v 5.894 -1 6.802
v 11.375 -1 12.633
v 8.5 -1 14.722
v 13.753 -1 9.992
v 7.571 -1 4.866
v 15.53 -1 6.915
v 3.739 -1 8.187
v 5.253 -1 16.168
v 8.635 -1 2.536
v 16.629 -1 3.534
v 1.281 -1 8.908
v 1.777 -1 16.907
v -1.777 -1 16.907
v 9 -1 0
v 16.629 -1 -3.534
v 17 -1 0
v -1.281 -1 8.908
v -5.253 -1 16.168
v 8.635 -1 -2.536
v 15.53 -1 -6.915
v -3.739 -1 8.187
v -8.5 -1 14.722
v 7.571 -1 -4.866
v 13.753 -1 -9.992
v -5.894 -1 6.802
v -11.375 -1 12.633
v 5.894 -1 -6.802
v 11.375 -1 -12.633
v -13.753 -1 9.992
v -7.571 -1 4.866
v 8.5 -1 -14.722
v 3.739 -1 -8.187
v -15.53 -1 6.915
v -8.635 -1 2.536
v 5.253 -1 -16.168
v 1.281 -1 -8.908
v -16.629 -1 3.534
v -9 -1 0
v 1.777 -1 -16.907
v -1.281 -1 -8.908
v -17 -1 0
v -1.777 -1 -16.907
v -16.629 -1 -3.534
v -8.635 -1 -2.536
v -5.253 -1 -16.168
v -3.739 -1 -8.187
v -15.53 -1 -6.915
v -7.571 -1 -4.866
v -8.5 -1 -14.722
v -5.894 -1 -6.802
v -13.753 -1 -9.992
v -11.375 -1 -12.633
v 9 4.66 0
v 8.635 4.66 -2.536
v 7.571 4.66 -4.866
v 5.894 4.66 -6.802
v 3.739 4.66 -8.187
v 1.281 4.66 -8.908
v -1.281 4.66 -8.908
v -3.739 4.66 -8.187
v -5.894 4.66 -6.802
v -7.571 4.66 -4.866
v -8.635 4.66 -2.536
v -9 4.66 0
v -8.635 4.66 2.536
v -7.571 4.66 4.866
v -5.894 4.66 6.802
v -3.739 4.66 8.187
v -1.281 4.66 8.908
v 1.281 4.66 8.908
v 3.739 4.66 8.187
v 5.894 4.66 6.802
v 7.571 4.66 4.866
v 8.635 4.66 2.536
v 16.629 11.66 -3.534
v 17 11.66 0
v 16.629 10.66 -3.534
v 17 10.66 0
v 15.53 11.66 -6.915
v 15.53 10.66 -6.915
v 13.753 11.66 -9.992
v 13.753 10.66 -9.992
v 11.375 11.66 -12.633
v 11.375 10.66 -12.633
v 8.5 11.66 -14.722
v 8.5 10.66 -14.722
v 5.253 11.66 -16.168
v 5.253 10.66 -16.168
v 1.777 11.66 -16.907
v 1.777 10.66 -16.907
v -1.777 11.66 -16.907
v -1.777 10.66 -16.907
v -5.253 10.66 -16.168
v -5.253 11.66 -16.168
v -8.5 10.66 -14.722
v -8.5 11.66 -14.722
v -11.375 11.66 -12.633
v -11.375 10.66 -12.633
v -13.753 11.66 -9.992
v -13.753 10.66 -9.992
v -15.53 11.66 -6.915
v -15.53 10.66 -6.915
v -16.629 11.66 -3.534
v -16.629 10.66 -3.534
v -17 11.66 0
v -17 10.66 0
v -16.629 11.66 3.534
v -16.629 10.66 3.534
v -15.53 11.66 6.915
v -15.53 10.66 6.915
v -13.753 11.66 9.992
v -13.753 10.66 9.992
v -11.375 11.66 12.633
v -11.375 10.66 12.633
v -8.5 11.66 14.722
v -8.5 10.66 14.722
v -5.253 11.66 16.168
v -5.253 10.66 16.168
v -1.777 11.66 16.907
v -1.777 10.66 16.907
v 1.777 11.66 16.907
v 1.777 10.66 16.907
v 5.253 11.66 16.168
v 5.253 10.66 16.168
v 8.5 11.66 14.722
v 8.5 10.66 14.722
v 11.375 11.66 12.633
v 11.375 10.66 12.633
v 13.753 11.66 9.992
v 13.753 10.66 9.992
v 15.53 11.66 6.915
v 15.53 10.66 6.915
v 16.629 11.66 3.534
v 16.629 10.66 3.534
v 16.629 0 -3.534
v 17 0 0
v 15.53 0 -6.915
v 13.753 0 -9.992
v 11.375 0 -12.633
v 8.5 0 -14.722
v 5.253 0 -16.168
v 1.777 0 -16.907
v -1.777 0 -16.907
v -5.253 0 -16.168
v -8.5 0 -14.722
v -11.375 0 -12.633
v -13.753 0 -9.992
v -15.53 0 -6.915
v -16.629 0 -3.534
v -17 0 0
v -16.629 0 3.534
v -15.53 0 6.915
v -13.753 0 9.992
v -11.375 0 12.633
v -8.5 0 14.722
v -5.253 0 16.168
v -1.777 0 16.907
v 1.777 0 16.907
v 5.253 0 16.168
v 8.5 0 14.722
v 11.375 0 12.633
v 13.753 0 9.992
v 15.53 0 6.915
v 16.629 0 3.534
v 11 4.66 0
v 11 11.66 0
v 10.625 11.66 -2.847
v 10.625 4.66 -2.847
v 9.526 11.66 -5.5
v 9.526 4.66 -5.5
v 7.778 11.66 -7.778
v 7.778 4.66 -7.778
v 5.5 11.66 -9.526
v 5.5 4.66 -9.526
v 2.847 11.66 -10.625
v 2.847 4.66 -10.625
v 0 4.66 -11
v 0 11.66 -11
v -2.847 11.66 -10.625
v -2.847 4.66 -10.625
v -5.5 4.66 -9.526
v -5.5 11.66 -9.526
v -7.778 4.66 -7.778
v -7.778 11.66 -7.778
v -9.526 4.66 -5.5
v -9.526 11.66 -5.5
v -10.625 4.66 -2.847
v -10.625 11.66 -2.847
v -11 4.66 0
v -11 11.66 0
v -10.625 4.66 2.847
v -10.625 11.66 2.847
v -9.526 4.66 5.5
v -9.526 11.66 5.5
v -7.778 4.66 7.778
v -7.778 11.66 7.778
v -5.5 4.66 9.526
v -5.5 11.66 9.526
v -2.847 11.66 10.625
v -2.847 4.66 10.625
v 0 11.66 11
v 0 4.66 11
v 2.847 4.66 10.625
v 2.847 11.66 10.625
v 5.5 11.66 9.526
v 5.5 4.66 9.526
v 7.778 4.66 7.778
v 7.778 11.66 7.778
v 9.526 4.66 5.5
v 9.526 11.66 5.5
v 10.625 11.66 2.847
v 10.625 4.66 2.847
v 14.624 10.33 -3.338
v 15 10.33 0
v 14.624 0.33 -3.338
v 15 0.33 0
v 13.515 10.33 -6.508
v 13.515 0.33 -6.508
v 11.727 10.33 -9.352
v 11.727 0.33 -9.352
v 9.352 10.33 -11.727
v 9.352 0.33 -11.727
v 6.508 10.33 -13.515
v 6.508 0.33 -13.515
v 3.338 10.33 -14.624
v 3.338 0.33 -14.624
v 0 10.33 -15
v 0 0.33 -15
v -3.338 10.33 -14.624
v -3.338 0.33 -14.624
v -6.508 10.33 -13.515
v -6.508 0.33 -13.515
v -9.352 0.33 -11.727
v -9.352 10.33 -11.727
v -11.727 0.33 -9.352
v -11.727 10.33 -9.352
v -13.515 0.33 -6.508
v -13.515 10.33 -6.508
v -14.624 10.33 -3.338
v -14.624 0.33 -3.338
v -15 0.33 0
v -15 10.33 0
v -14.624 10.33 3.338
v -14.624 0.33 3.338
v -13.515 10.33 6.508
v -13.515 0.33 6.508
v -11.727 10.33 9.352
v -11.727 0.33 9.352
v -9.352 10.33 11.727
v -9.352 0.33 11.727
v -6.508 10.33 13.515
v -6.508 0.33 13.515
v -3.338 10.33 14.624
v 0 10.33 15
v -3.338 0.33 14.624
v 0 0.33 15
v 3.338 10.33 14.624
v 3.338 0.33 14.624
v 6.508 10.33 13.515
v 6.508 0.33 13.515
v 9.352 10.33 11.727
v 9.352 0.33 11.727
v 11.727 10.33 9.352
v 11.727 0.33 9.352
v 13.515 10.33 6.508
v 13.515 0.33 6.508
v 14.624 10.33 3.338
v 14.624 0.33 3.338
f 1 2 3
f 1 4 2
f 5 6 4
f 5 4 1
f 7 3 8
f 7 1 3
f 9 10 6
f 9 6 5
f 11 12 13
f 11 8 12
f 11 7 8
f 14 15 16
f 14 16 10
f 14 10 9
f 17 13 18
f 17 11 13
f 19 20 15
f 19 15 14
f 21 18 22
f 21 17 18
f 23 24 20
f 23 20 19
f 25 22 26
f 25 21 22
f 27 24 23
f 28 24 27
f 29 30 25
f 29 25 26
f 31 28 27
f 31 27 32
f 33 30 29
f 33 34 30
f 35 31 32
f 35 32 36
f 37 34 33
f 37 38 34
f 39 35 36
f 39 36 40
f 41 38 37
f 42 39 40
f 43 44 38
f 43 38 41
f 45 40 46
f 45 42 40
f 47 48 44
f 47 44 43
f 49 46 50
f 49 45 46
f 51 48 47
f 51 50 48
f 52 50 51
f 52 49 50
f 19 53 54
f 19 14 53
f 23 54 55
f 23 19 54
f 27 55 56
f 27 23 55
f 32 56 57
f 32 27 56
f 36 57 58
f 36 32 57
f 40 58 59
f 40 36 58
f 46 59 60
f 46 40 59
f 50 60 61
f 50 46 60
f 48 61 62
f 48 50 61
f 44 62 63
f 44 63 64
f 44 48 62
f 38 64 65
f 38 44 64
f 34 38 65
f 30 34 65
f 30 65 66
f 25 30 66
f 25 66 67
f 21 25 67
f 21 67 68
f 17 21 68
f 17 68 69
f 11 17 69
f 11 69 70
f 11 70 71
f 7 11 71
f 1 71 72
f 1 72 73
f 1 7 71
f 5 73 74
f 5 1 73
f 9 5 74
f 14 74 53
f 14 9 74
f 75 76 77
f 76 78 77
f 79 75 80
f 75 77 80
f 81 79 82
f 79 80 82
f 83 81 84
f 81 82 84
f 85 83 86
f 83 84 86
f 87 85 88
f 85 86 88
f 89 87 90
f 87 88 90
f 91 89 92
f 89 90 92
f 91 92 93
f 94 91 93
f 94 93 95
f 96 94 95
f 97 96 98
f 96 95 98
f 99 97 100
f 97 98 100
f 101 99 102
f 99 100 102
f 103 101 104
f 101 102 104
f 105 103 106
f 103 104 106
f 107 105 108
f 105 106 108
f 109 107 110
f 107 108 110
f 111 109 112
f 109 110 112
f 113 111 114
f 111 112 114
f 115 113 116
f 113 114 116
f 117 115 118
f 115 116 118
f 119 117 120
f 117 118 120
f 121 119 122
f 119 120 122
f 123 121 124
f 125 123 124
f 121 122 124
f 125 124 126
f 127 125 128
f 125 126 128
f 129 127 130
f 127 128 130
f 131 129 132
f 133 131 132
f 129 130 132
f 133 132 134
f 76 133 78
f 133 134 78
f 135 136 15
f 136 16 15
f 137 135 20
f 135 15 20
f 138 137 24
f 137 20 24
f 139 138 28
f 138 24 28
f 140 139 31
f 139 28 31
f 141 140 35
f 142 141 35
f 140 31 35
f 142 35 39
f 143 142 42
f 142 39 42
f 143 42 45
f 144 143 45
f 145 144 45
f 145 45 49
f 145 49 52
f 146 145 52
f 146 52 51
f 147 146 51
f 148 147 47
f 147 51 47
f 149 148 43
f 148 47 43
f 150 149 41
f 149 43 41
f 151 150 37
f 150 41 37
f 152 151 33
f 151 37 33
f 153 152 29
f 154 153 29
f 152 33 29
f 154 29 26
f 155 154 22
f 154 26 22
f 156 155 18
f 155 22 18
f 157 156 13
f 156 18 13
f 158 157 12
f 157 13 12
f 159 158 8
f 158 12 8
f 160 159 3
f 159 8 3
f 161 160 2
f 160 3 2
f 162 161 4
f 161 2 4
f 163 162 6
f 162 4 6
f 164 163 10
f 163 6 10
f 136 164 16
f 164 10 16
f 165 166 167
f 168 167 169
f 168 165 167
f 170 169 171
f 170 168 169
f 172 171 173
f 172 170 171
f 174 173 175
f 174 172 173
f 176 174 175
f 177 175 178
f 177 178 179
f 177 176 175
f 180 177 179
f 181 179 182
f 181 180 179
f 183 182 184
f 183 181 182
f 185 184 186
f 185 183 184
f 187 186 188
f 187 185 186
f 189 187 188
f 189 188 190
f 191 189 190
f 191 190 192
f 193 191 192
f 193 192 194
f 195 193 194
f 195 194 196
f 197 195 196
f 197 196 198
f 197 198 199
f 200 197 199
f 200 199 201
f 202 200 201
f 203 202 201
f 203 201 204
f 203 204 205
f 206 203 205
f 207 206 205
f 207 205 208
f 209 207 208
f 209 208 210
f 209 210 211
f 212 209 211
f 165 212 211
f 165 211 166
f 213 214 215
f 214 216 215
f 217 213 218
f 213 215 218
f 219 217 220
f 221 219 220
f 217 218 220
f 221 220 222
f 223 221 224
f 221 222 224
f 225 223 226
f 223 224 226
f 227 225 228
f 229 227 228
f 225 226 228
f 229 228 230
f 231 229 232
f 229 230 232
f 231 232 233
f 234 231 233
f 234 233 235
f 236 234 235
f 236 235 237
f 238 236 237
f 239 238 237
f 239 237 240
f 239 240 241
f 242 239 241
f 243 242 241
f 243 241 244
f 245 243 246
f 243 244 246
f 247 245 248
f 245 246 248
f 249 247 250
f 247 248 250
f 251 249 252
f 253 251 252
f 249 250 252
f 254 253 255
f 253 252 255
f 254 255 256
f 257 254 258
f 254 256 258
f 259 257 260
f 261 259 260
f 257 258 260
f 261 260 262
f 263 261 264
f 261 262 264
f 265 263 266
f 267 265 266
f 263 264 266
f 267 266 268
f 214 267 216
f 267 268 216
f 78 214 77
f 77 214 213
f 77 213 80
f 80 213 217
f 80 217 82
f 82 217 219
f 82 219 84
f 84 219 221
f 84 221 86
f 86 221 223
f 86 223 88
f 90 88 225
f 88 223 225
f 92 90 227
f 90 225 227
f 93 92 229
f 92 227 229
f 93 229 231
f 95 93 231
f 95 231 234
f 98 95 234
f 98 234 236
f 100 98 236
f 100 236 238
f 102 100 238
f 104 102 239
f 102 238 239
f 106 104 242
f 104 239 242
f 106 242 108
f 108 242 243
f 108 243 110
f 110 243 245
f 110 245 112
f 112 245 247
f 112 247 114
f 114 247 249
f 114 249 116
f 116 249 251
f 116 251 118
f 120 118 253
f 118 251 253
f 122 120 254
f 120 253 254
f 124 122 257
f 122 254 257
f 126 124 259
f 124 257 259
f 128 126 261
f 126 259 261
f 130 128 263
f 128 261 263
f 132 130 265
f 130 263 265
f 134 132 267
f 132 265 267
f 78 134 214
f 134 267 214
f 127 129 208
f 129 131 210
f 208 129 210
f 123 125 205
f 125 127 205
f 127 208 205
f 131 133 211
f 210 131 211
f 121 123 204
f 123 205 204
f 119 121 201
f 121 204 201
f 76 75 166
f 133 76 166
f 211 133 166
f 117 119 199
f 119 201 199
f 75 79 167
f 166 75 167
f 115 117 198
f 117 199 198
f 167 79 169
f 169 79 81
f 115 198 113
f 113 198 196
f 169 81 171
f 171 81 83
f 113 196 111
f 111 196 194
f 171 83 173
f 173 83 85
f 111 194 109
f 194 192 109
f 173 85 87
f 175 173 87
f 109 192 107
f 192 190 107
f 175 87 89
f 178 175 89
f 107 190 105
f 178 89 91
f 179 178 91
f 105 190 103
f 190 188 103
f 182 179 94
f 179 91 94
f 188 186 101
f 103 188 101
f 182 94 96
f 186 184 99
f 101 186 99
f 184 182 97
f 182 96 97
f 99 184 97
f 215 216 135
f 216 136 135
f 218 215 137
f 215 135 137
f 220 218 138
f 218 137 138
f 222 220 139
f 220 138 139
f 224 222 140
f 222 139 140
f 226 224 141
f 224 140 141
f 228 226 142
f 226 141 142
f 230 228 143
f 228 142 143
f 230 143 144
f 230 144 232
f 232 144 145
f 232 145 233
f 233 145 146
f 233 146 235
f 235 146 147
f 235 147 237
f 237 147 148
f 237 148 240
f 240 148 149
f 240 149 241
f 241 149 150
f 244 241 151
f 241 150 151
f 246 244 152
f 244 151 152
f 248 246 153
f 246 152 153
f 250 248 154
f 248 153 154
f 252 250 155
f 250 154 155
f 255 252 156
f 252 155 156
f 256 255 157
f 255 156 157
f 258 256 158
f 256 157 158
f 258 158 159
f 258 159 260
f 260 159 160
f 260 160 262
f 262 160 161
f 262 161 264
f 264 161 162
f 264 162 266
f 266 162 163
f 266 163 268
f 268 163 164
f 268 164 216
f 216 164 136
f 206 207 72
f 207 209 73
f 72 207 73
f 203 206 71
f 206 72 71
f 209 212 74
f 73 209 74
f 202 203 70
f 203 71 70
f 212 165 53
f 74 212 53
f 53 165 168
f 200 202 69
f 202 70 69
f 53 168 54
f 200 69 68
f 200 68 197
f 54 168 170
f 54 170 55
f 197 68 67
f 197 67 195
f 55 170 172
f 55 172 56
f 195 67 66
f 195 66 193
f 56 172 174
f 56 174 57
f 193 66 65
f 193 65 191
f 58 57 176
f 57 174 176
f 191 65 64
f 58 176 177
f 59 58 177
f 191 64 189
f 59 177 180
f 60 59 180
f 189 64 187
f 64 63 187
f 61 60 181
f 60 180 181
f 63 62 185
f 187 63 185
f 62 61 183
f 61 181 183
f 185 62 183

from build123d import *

# Parameters (mm, degrees)
SKETCH1_R           = 15
SKETCH1_R_2         = 11
BOSS_EXTRUDE1_DEPTH = 11.66


with BuildPart() as part:
    # Sketch1 → Boss-Extrude1 (new body)
    with BuildSketch(Plane(origin=(0, 0, 0), x_dir=(1, 0, 0), z_dir=(0, 1, 0))):
        Circle(SKETCH1_R)
        Circle(SKETCH1_R_2, mode=Mode.SUBTRACT)
    extrude(amount=BOSS_EXTRUDE1_DEPTH)

    # Sketch2 → Revolve1 (revolve)
    with BuildSketch(Plane.XY):
        Polygon((15, 11.66), (17, 11.66), (17, 10.66), (15, 10.33), align=None)
        Polygon((15, 0.33), (17, 0), (17, -1), (15, -1), (9, -1), (9, 0.33), (9, 4.66), (15, 4.66), align=None)
    revolve(axis=Axis((0, 0, 0), (0, 1, 0)))


solid = part.part
